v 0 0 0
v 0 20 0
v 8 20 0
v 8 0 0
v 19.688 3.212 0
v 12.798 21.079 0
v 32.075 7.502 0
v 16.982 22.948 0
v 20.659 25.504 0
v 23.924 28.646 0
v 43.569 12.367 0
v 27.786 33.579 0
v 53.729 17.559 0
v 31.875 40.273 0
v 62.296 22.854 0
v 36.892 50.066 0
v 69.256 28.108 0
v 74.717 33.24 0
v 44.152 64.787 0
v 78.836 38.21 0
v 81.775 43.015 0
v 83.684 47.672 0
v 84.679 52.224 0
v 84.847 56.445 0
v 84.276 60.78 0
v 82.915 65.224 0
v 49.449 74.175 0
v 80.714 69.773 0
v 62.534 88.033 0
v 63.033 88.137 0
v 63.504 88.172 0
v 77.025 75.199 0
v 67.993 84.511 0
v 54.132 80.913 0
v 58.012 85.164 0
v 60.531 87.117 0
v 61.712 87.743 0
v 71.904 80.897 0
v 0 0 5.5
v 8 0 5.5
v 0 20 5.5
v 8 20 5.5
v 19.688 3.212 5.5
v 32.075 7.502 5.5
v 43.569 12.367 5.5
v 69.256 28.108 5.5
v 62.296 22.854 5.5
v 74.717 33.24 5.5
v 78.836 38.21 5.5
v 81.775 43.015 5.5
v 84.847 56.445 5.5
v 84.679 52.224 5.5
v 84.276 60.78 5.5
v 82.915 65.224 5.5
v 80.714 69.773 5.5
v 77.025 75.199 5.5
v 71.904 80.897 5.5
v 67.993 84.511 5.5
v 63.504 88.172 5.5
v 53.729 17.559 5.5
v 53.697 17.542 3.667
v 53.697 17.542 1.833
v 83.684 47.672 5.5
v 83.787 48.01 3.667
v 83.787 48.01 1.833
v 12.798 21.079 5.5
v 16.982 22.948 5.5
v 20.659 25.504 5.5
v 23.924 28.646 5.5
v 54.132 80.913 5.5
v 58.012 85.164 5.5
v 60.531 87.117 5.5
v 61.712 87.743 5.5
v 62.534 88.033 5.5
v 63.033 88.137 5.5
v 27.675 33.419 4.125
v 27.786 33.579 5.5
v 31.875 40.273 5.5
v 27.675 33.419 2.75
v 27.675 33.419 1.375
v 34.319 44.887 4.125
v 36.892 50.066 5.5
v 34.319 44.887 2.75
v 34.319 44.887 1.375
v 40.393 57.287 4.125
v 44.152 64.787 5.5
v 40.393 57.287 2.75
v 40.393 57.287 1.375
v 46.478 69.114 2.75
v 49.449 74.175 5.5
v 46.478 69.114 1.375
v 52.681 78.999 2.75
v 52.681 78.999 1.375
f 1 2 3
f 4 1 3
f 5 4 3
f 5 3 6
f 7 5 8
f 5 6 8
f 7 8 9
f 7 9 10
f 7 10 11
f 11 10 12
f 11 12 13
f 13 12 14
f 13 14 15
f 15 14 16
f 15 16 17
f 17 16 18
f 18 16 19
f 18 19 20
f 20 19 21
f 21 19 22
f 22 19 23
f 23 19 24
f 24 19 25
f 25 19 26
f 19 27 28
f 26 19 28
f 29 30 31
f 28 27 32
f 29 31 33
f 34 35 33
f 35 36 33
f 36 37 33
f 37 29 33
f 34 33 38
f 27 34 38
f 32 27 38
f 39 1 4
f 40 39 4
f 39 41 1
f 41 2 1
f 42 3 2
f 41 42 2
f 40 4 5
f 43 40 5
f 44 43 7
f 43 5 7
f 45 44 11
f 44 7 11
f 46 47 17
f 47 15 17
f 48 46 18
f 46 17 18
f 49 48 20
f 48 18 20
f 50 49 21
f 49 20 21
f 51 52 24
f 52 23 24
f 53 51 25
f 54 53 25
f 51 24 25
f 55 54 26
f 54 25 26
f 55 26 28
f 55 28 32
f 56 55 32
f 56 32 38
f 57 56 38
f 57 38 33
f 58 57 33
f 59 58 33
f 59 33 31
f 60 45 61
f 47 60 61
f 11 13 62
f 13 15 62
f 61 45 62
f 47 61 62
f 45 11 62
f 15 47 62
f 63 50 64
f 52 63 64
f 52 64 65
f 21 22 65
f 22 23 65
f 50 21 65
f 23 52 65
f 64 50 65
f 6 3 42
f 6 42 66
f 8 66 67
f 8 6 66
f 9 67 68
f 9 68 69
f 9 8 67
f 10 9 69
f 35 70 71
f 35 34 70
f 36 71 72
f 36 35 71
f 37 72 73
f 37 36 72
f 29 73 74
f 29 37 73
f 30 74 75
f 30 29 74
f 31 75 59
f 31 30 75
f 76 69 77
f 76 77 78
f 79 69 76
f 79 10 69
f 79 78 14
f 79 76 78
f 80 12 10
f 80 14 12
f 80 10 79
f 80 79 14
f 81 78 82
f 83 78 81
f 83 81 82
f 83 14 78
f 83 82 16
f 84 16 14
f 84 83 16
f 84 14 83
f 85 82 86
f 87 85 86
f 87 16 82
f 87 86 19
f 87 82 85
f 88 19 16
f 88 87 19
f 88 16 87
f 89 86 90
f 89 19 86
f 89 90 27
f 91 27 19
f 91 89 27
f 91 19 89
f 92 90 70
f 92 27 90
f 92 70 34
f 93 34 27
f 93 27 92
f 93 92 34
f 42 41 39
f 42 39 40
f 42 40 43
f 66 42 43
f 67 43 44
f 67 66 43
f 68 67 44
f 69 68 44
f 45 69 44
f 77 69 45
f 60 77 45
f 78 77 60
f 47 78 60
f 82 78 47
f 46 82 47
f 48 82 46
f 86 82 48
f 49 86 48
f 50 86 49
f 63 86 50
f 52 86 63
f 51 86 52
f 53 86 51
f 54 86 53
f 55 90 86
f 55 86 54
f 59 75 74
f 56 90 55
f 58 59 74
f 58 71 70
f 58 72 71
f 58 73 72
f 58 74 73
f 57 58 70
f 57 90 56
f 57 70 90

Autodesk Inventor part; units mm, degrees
ref_plane "YZ Plane" through (0, 0, 0) normal (1, 0, 0) x (0, 1, 0)
ref_plane "XZ Plane" through (0, 0, 0) normal (0, 1, 0) x (-1, 0, 0)
ref_plane "XY Plane" through (0, 0, 0) normal (0, 0, 1) x (1, 0, 0)
sketch "Sketch1" plane through (0, 0, 0) normal (0, 0, 1) x (1, 0, 0)
  line L0 (0, 0) -> (8, 0)
  line L1 (8, 20) -> (0, 20)
  line L2 (0, 20) -> (0, 0)
  line L3 (8, 0) -> (49.9131, 10) construction
  line L4 (49.9131, 10) -> (120.5614, 44.2415) construction
  line L5 (120.5614, 44.2415) -> (63.5038, 88.1716) construction
  spline S0 degree 3 poles (8, 0) (49.9131, 10) (120.5614, 44.2415) (63.5038, 88.1716) knots 1 1 1 1 2 2 2 2
  line L6 (8, 20) -> (35.2198, 23.4351) construction
  line L7 (35.2198, 23.4351) -> (35.2198, 60.333) construction
  line L8 (35.2198, 60.333) -> (55.6473, 88.1716) construction
  line L9 (55.6473, 88.1716) -> (63.5038, 88.1716) construction
  spline S1 degree 4 poles (8, 20) (35.2198, 23.4351) (35.2198, 60.333) (55.6473, 88.1716) (63.5038, 88.1716) knots 1 1 1 1 1 2 2 2 2 2
  dimension "d6" = 8
extrude "Extrusion1" add sketch "Sketch1" along normal blind 5.5
properties part number "cola"
